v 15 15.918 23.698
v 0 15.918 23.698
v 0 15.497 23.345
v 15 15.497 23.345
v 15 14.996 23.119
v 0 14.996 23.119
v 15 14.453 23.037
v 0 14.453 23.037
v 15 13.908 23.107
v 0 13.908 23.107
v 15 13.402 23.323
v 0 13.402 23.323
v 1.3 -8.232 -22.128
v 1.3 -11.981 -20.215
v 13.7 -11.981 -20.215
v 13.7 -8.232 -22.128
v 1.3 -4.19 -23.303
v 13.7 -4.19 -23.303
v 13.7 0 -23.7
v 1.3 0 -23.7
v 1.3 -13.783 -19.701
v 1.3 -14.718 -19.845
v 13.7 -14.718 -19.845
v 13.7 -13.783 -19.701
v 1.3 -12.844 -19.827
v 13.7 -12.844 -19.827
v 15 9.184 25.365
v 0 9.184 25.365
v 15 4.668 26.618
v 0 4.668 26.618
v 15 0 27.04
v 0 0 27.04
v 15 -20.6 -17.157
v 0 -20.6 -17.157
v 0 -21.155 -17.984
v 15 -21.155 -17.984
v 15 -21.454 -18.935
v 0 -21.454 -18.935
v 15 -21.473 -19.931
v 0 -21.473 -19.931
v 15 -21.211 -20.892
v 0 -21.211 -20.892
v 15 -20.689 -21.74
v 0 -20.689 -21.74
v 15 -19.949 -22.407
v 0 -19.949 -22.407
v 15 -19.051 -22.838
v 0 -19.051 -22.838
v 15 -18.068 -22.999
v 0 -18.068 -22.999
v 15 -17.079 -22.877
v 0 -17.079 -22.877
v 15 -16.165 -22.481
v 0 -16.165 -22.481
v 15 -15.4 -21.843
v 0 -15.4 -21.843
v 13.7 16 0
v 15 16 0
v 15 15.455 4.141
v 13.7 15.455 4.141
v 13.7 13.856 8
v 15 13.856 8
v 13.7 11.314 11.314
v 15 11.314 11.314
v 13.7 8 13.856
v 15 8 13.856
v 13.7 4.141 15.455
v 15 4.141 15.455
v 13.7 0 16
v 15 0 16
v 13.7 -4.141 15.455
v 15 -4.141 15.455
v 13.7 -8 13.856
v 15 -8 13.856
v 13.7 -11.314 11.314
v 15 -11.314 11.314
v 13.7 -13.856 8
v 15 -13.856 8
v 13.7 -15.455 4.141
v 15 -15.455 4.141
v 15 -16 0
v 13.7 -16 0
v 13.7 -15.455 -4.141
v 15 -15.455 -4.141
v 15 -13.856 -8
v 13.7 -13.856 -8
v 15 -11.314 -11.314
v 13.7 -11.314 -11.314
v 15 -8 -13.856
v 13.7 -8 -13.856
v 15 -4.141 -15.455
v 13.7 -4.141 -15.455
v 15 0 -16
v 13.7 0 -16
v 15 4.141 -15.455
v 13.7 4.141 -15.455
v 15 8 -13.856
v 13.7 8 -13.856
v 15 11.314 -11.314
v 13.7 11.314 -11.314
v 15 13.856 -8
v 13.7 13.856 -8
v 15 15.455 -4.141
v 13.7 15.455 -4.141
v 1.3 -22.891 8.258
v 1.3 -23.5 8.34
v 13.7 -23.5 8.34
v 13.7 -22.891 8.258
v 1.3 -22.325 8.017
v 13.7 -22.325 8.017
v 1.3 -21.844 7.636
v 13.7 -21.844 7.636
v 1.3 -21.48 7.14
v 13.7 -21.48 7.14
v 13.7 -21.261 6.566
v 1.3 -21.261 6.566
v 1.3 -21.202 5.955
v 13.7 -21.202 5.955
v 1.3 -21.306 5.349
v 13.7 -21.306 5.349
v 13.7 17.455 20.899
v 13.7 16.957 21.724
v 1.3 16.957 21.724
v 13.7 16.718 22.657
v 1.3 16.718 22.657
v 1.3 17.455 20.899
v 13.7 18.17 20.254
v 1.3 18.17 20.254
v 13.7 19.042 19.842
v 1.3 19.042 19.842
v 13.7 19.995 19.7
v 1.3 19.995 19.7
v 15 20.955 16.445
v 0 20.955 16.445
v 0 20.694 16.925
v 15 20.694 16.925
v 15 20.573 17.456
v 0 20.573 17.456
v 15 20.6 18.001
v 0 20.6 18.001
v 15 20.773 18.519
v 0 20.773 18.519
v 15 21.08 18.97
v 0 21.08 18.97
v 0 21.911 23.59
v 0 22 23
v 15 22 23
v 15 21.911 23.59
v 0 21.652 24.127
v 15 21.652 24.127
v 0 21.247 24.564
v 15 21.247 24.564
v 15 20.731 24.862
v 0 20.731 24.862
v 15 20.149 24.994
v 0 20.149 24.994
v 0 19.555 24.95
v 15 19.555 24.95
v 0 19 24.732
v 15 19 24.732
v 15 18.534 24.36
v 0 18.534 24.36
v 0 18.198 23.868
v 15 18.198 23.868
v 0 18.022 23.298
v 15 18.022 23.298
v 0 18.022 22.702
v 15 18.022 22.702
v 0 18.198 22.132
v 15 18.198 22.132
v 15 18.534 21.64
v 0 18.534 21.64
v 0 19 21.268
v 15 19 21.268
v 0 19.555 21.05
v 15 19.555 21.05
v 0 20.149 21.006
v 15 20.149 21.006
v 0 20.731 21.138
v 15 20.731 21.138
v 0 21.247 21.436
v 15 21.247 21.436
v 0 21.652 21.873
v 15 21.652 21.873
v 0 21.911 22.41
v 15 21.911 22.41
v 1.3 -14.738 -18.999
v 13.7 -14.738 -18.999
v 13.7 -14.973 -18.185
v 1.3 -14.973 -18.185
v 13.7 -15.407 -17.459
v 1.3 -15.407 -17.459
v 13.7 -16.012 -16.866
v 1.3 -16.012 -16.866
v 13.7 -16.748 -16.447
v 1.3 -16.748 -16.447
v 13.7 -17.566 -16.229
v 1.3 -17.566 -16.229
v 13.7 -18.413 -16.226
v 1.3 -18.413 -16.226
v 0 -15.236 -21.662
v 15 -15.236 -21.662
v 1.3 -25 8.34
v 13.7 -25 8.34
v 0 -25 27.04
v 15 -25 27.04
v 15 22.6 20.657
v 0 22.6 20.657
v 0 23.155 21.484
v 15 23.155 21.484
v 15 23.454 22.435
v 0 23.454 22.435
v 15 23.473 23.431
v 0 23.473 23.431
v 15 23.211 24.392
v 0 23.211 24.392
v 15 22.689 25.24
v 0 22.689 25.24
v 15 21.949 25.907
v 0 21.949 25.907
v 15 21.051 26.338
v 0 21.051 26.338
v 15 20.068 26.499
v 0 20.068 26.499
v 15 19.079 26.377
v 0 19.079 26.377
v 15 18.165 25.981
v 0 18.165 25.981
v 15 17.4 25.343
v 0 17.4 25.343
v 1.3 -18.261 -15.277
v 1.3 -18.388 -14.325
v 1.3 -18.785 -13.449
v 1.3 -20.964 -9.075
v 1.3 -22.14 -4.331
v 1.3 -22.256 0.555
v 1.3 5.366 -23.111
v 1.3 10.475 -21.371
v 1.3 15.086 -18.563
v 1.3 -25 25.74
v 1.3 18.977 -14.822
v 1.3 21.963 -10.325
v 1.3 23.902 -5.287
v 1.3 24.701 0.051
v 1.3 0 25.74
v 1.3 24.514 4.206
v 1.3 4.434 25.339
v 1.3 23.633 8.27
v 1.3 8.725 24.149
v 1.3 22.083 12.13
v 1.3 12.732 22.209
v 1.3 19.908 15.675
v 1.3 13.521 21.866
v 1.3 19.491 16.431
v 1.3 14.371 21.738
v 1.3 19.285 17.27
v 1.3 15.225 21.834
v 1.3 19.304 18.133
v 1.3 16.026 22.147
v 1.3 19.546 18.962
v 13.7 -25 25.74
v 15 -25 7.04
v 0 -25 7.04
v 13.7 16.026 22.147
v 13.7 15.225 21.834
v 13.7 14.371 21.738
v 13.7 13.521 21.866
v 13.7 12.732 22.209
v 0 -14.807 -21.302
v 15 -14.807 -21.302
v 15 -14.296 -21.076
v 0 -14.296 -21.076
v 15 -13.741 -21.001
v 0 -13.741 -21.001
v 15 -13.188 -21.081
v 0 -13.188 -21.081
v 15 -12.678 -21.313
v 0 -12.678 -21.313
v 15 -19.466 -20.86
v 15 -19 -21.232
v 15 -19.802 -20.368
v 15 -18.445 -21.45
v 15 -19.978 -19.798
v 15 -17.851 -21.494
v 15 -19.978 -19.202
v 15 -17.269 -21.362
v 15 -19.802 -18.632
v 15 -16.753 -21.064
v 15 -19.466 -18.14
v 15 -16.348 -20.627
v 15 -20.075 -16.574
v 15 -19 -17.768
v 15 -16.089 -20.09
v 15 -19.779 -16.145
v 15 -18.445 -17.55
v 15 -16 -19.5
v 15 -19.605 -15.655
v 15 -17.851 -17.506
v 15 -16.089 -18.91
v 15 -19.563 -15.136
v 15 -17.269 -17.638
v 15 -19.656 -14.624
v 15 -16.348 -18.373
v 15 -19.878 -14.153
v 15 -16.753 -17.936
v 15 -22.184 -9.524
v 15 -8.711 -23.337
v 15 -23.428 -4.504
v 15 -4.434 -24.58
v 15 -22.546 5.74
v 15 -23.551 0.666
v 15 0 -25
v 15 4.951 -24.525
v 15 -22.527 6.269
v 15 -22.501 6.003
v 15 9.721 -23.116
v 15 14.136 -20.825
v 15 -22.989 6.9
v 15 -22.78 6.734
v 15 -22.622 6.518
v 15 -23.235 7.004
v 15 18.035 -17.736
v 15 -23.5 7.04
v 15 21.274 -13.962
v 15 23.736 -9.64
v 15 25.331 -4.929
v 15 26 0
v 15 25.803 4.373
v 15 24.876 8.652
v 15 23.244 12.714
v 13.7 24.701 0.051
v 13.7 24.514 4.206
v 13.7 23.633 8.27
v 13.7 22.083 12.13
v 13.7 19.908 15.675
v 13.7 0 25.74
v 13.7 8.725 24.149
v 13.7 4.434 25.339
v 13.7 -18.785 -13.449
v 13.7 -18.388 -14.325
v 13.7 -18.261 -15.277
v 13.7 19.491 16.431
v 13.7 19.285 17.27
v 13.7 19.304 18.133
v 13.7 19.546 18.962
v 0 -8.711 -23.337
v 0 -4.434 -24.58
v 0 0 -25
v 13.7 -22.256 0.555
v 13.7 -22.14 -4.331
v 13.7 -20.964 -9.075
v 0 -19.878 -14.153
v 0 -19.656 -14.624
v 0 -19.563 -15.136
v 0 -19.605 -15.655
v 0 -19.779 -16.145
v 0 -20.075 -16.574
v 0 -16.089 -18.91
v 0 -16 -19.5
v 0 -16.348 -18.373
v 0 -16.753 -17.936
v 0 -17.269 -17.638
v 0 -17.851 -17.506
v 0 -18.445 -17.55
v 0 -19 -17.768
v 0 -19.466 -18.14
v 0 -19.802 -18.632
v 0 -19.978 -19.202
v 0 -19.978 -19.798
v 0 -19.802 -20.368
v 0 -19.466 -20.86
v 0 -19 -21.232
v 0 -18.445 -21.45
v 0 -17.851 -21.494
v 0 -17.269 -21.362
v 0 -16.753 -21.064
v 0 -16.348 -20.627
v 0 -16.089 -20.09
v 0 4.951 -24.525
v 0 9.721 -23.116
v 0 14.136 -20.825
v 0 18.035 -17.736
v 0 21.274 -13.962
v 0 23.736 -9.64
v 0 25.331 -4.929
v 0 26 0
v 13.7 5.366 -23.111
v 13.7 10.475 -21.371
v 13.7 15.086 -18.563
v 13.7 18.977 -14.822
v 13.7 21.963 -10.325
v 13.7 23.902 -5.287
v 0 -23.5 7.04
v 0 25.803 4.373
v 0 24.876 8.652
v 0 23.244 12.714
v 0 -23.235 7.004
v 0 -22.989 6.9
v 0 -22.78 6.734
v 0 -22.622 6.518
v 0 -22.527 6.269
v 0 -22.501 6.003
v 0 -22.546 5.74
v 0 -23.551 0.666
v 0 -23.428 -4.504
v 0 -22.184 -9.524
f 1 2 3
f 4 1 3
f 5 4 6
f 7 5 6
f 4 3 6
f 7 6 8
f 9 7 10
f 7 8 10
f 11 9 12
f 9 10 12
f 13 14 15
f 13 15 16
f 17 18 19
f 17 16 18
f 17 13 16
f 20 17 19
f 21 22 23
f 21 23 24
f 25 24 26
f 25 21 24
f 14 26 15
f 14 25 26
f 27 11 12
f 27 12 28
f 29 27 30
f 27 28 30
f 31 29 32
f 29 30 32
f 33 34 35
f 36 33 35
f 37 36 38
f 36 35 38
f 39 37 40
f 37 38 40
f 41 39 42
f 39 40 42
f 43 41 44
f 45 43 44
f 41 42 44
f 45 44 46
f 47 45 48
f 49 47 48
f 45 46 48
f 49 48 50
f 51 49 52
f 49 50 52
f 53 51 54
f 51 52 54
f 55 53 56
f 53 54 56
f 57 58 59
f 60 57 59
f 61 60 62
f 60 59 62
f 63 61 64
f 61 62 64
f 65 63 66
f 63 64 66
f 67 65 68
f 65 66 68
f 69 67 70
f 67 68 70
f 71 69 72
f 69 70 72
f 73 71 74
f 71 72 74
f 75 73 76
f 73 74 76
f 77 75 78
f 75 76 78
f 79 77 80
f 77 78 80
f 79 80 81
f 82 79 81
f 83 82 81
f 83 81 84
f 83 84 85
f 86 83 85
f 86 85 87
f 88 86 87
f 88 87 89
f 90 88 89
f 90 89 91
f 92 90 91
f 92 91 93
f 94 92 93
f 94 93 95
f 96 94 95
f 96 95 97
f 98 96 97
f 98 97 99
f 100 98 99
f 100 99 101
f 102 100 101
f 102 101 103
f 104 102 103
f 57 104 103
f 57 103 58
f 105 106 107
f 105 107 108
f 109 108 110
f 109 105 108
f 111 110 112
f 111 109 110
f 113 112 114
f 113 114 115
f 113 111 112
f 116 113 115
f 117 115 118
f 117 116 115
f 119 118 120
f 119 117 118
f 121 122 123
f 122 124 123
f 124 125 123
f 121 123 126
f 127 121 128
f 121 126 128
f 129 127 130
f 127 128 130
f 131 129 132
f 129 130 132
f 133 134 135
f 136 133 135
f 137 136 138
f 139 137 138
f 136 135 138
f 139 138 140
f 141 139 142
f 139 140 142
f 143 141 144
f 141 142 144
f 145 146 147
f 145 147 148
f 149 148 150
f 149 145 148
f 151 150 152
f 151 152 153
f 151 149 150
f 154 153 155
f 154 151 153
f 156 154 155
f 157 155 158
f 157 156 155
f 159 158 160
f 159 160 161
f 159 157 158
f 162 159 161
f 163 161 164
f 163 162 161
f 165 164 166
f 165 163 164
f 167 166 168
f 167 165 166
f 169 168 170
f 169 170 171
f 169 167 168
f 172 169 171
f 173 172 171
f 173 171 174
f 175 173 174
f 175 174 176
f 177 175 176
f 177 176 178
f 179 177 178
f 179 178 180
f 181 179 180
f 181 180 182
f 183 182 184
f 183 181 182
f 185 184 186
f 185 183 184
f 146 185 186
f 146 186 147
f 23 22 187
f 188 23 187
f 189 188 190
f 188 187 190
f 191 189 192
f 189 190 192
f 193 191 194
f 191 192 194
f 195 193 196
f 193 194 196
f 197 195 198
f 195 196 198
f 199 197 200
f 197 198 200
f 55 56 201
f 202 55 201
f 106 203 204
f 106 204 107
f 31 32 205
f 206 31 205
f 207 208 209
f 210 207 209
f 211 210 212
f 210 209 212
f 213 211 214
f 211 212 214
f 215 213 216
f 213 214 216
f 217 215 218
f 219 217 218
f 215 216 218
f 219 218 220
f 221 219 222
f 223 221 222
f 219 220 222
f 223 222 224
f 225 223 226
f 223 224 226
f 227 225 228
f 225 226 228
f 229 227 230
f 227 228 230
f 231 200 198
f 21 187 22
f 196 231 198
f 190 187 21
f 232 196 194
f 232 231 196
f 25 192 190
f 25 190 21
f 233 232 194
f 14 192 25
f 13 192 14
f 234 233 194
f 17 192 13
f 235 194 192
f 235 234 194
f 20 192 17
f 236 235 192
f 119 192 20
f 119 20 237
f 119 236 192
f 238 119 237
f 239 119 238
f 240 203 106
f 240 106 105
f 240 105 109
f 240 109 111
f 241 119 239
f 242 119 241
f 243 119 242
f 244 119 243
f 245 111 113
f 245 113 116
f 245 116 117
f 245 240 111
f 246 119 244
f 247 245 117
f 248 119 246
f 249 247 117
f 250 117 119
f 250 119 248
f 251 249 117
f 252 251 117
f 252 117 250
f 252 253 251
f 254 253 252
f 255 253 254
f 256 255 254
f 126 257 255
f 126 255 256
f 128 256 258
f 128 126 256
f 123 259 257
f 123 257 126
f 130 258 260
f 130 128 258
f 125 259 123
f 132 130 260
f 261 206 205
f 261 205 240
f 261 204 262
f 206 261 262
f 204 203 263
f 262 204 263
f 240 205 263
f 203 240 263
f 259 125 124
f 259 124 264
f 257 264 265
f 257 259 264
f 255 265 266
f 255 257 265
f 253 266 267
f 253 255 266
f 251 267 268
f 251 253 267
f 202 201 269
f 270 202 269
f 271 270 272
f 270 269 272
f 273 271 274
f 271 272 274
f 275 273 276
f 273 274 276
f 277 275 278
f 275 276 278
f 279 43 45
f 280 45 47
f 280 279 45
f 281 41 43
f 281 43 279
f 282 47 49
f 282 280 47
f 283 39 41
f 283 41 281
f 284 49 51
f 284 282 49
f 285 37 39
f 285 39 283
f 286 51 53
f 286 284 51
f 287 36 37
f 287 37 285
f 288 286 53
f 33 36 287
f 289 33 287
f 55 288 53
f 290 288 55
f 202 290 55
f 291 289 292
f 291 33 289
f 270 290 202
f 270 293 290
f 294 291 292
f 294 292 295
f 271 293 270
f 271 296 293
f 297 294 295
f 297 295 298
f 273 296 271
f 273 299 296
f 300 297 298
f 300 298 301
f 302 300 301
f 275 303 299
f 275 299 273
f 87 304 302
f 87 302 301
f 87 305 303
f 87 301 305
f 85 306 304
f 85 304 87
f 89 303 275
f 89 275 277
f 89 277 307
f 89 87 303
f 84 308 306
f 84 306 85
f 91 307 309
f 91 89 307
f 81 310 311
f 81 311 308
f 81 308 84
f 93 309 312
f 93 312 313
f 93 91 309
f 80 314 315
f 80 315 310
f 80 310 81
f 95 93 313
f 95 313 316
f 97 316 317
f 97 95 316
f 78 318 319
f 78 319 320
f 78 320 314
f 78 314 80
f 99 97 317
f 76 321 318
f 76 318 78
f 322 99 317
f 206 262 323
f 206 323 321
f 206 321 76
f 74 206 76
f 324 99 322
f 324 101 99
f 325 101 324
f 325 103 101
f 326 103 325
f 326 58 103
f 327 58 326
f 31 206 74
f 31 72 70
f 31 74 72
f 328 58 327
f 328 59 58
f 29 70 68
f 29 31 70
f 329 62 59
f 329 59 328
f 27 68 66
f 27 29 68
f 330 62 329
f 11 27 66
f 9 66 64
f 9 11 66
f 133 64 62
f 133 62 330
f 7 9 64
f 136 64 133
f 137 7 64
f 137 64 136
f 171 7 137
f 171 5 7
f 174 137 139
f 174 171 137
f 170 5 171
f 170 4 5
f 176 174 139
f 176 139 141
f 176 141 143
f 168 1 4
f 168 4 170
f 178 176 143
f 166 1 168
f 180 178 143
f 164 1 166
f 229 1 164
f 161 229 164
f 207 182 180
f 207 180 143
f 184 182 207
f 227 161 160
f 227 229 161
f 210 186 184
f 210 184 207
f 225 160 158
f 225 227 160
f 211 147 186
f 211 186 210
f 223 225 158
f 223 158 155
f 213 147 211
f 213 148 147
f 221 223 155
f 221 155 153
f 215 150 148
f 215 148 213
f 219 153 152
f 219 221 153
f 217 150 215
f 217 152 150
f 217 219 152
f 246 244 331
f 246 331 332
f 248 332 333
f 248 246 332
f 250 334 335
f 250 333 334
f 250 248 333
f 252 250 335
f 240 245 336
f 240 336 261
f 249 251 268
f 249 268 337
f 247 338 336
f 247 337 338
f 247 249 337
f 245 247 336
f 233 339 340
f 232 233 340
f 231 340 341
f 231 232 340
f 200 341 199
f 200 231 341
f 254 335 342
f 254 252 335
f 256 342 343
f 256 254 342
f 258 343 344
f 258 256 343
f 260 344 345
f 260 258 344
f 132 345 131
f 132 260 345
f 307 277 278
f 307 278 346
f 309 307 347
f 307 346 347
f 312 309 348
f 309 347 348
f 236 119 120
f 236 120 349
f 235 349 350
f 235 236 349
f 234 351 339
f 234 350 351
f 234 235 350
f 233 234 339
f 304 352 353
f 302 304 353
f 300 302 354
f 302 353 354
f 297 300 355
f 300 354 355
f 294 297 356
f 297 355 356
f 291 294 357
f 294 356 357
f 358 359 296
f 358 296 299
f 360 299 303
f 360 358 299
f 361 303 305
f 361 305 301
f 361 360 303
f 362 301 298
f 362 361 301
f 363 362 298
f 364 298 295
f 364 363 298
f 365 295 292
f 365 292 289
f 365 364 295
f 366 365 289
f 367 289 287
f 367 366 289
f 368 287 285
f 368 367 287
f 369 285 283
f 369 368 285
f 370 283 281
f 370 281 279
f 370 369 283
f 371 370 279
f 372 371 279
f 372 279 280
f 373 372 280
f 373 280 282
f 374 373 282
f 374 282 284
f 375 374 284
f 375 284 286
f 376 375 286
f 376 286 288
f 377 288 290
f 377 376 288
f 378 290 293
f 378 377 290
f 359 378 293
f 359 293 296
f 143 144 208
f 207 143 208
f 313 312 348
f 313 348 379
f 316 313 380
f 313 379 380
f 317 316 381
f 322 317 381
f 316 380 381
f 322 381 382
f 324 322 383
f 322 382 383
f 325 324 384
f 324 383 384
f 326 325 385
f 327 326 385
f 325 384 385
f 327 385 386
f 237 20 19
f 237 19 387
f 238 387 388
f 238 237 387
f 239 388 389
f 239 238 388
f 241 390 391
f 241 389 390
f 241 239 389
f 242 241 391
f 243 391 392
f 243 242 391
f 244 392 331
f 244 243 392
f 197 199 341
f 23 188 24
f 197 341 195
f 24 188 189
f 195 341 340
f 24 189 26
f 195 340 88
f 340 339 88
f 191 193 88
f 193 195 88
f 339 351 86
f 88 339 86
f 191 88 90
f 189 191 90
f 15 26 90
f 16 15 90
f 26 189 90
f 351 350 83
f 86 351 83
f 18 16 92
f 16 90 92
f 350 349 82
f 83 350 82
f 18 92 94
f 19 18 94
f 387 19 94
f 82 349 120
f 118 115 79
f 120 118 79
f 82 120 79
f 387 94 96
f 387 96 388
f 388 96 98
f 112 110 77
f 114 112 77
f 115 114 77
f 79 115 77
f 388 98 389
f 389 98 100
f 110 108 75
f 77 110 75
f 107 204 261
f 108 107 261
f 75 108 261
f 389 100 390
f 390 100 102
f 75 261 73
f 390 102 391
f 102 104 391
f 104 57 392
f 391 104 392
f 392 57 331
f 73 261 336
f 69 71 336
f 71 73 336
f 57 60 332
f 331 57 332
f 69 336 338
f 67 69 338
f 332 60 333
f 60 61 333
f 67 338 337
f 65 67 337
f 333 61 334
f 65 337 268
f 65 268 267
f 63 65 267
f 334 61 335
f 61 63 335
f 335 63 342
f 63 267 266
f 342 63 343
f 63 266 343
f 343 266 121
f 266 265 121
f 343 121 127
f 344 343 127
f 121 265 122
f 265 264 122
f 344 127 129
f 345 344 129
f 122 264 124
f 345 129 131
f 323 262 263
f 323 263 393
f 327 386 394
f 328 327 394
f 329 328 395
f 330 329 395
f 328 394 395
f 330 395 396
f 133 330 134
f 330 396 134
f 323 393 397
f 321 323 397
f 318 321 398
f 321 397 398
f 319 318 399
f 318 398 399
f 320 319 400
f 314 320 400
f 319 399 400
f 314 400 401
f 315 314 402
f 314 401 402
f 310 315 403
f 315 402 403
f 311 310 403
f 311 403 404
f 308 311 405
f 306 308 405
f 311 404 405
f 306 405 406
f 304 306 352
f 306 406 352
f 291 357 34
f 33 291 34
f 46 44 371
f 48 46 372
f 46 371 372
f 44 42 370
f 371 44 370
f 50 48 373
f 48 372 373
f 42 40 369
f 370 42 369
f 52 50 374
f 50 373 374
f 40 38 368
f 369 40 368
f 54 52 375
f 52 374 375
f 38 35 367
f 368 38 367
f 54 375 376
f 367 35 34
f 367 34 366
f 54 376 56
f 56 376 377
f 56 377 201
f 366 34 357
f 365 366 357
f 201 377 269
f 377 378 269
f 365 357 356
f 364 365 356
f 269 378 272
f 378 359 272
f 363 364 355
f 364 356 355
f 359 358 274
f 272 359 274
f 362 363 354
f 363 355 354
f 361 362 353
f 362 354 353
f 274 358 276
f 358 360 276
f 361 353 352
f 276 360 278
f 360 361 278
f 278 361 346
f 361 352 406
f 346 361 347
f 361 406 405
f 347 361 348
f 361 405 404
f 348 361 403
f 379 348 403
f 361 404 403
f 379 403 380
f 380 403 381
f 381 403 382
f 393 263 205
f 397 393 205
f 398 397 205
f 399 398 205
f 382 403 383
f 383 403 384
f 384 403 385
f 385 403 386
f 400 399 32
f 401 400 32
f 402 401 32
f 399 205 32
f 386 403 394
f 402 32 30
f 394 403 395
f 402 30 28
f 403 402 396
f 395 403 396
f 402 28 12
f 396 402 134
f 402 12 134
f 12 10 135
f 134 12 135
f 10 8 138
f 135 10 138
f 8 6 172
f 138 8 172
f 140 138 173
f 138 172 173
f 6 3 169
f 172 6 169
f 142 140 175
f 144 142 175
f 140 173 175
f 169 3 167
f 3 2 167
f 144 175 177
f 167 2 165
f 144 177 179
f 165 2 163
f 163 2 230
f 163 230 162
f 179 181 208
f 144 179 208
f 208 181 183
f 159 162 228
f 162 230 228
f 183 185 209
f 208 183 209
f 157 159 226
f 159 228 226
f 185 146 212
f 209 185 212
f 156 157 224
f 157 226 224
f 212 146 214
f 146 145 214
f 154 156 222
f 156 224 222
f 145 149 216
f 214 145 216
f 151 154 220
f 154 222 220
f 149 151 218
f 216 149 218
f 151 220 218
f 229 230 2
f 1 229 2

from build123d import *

# Parameters (mm, degrees)
F0_R     = 2
F0_R_2   = 16
F0_R_3   = 12
F1_DEPTH = 15
F2_T     = -1.3
F3_R     = 16
F4_DEPTH = 13.7


with BuildPart() as f1:
    # F0 (on Right) → F1 (new body)
    with BuildSketch(Plane.YZ):
        with BuildLine():
            Line((0, 27.04), (-25, 27.04))
            Line((-25, 27.04), (-25, 7.04))
            Line((-25, 7.04), (-23.5, 7.04))
            ThreePointArc((-23.5, 7.04), (-22.6936430136, 6.6314291255), (-22.5461939854, 5.7395768209))
            ThreePointArc((-22.5461939854, 5.7395768209), (-23.4283913263, -4.5038147219), (-19.878453039, -14.152818847))
            ThreePointArc((-19.878453039, -14.152818847), (-19.5668833751, -15.3965751397), (-20.074631189, -16.5739440406))
            Line((-20.074631189, -16.5739440406), (-20.6000079963, -17.1569339704))
            ThreePointArc((-20.6000079963, -17.1569339704), (-20.3430660296, -22.1000079963), (-15.3999920037, -21.8430660296))
            Line((-15.3999920037, -21.8430660296), (-15.2364696163, -21.6616116833))
            ThreePointArc((-15.2364696163, -21.6616116833), (-14.0211573422, -21.0188707984), (-12.6780712141, -21.3125022359))
            ThreePointArc((-12.6780712141, -21.3125022359), (-6.6017257113, -24.0594120315), (0, -25))
            ThreePointArc((0, -25), (18.0346887969, -17.7360763487), (26, 0))
            ThreePointArc((26, 0), (24.8756586881, 8.6516449625), (20.9547141799, 16.4453153497))
            ThreePointArc((20.9547141799, 16.4453153497), (20.5678212068, 17.7298278052), (21.0796574448, 18.969860904))
            Line((21.0796574448, 18.969860904), (22.6000079963, 20.6569339704))
            ThreePointArc((22.6000079963, 20.6569339704), (22.3430660296, 25.6000079963), (17.3999920037, 25.3430660296))
            Line((17.3999920037, 25.3430660296), (15.9178980328, 23.6984447825))
            ThreePointArc((15.9178980328, 23.6984447825), (14.7273428061, 23.0592399542), (13.4020450466, 23.3230398953))
            ThreePointArc((13.4020450466, 23.3230398953), (6.9539665632, 26.0935467981), (0, 27.04))
        make_face()
        with Locations((-18, -19.5)):
            Circle(F0_R, mode=Mode.SUBTRACT)
        Circle(F0_R_2, mode=Mode.SUBTRACT)
        with Locations((20, 23)):
            Circle(F0_R, mode=Mode.SUBTRACT)
        Circle(F0_R_2)
        Circle(F0_R_3, mode=Mode.SUBTRACT)
        Circle(F0_R_3)
    extrude(amount=F1_DEPTH)

    # F2
    f2_openings = [f1.faces().sort_by_distance(p)[0] for p in [
        (7.5, -25, 17.04),
    ]]
    offset(amount=F2_T, openings=f2_openings)

    # F3 (on face) → F4 (cut, through all)
    with BuildSketch(Plane.YZ.offset(15)):
        Circle(F3_R)
    extrude(amount=-F4_DEPTH, mode=Mode.SUBTRACT)


solid = f1.part
